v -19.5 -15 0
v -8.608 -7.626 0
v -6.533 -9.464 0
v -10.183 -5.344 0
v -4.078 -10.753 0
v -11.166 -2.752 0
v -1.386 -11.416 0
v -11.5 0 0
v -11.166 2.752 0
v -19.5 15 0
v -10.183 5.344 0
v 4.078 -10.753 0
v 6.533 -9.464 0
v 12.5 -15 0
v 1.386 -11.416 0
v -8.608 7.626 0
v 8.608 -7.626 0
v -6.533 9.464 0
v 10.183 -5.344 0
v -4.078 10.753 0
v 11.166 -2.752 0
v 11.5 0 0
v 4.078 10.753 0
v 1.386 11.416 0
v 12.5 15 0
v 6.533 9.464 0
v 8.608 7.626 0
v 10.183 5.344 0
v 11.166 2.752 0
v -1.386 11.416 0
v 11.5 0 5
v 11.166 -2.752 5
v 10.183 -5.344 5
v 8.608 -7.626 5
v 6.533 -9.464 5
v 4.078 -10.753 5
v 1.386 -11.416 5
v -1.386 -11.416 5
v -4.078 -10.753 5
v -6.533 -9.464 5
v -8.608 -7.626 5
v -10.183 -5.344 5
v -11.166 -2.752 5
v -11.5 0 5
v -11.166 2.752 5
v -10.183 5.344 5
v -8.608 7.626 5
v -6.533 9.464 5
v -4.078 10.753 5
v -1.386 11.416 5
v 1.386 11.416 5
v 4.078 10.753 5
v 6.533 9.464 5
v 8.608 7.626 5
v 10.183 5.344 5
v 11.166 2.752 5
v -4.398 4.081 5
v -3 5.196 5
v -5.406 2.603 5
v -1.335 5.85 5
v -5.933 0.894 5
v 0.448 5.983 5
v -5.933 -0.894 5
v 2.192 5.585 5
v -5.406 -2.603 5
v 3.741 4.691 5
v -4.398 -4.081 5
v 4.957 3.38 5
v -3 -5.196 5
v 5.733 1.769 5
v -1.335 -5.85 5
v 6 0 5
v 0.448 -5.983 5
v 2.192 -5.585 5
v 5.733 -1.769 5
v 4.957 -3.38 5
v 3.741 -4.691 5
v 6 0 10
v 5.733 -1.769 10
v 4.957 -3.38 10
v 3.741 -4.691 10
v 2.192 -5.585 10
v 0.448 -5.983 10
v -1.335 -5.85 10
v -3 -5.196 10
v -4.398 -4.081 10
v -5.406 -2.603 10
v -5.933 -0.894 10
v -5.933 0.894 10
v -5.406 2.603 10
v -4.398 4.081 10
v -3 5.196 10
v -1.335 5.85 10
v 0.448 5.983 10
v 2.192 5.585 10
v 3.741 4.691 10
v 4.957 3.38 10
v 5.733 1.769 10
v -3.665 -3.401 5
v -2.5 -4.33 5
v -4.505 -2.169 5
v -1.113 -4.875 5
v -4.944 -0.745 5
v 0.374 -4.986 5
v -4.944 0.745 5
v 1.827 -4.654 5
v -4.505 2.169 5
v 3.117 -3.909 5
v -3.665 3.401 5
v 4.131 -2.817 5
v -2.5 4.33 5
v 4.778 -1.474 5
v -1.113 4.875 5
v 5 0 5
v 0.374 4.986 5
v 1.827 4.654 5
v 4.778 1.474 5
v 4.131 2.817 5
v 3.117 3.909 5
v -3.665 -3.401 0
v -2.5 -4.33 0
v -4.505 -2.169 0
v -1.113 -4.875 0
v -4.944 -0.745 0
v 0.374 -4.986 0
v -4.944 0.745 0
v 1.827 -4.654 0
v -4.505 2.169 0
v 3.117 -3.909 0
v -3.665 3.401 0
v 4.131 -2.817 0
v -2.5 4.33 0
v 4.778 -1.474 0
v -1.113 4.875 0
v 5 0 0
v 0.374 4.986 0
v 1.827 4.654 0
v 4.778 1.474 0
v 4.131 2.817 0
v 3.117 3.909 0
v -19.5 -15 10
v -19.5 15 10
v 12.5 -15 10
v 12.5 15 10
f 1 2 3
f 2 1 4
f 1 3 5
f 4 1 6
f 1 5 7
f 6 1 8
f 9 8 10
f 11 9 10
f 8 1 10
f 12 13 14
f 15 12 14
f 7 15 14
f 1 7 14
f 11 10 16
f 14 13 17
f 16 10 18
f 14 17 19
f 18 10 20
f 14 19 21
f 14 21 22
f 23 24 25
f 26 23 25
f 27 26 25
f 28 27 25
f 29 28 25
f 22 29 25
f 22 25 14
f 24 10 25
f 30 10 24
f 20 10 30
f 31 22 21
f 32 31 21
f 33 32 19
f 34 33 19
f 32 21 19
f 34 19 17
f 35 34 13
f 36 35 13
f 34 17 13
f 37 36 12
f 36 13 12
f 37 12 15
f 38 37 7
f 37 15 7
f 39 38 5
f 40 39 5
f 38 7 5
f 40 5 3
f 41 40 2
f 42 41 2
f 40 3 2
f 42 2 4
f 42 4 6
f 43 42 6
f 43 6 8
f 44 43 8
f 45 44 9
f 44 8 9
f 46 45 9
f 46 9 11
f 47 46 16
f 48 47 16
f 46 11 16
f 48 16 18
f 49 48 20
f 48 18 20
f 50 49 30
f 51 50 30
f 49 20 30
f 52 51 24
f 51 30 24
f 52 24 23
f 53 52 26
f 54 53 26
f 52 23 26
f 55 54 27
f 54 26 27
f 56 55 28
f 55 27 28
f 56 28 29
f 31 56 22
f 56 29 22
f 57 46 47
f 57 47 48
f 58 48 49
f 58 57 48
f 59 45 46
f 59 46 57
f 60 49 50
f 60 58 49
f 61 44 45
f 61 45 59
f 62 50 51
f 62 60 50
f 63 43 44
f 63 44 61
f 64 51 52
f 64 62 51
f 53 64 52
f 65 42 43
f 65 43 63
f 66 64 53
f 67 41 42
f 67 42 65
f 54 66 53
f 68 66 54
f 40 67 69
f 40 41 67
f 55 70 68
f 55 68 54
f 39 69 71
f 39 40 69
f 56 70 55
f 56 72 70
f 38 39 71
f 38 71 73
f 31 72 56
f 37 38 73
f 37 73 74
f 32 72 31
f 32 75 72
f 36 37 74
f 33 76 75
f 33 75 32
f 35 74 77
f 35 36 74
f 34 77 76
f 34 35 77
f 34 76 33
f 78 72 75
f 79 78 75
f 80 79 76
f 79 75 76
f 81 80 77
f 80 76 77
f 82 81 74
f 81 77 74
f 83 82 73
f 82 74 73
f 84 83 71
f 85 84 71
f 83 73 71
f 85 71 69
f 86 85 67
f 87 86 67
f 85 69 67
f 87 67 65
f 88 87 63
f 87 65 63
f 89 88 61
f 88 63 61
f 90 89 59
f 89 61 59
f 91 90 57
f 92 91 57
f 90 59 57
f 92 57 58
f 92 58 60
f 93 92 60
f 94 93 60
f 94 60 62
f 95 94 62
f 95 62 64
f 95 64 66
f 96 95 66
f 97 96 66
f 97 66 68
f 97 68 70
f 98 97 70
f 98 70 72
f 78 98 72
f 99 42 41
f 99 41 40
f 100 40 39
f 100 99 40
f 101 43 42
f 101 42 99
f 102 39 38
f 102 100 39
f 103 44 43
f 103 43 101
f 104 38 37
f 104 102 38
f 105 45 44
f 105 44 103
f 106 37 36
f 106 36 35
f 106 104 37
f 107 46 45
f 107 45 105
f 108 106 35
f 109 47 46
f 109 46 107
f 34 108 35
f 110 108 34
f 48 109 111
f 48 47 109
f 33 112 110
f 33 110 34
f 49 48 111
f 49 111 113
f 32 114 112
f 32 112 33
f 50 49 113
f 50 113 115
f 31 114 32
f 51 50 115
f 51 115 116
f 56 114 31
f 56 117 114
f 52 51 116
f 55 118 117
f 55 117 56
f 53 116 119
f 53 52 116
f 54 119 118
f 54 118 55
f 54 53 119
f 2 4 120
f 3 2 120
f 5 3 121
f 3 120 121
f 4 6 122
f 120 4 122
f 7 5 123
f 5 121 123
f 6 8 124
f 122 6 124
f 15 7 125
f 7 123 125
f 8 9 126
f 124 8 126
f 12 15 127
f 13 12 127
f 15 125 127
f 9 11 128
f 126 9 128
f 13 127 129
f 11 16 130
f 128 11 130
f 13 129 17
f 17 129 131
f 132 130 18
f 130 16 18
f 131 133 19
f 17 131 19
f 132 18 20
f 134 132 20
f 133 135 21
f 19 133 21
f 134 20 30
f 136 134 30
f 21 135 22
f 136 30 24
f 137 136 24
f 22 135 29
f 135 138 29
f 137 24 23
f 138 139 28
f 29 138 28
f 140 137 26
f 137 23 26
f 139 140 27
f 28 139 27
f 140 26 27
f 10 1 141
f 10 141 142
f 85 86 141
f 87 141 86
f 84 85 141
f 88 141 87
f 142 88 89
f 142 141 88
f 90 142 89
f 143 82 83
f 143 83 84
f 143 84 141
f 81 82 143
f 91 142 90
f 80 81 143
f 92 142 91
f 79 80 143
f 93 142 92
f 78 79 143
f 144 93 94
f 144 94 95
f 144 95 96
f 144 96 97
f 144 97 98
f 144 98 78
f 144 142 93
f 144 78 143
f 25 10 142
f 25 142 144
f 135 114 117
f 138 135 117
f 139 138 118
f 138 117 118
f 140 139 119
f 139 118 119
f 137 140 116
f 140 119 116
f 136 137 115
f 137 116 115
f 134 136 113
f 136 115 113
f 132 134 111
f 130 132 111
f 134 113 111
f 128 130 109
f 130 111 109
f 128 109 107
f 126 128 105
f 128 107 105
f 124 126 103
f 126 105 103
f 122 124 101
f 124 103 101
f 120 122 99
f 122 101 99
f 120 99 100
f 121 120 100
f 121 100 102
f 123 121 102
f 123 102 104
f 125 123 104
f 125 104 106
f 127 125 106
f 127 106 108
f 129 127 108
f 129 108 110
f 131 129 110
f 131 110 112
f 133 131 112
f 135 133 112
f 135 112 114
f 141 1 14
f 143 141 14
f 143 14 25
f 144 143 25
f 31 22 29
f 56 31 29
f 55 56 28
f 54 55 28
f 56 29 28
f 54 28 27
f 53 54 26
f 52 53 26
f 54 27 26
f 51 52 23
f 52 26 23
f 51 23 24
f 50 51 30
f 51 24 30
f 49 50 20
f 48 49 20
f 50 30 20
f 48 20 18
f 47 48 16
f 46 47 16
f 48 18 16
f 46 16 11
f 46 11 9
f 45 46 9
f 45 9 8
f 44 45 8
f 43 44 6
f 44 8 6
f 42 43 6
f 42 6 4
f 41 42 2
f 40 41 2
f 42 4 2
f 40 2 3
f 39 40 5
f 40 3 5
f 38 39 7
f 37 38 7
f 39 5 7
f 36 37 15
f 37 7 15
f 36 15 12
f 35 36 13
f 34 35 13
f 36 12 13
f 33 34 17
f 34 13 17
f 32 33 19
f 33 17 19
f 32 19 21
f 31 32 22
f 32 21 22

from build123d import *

# Parameters (mm, degrees)
CYLINDER_R      = 11.5
CYLINDER_DEPTH  = 5
SKETCH_R        = 5
POCKET_DEPTH    = 5.001
BOX_W           = 32
BOX_H           = 30
BOX_DEPTH       = 10
SKETCH001_R     = 11.5
POCKET001_DEPTH = 5
SKETCH002_R     = 6
POCKET002_DEPTH = 10.001


with BuildPart() as pocket:
    # Cylinder → Cylinder (new body)
    with BuildSketch(Plane.XY):
        Circle(CYLINDER_R)
    extrude(amount=CYLINDER_DEPTH)

    # Sketch → Pocket (cut, through all)
    with BuildSketch(Plane.XY.offset(5)):
        Circle(SKETCH_R)
    extrude(amount=-POCKET_DEPTH, mode=Mode.SUBTRACT)


with BuildPart() as pocket002:
    # Box → Box (new body)
    with BuildSketch(Plane(origin=(-19.5, -15, 0), x_dir=(1, 0, 0), z_dir=(0, 0, 1))):
        with Locations((16, 15)):
            Rectangle(BOX_W, BOX_H)
    extrude(amount=BOX_DEPTH)

    # Sketch001 → Pocket001 (cut)
    with BuildSketch(Plane(origin=(-19.5, -15, 0), x_dir=(1, 0, 0), z_dir=(0, 0, -1))):
        with Locations((19.5, -15)):
            Circle(SKETCH001_R)
    extrude(amount=-POCKET001_DEPTH, mode=Mode.SUBTRACT)

    # Sketch002 → Pocket002 (cut, through all)
    with BuildSketch(Plane(origin=(-19.5, -15, 0), x_dir=(1, 0, 0), z_dir=(0, 0, -1))):
        with Locations((19.5, -15)):
            Circle(SKETCH002_R)
    extrude(amount=-POCKET002_DEPTH, mode=Mode.SUBTRACT)


solid = Compound([pocket.part, pocket002.part])
